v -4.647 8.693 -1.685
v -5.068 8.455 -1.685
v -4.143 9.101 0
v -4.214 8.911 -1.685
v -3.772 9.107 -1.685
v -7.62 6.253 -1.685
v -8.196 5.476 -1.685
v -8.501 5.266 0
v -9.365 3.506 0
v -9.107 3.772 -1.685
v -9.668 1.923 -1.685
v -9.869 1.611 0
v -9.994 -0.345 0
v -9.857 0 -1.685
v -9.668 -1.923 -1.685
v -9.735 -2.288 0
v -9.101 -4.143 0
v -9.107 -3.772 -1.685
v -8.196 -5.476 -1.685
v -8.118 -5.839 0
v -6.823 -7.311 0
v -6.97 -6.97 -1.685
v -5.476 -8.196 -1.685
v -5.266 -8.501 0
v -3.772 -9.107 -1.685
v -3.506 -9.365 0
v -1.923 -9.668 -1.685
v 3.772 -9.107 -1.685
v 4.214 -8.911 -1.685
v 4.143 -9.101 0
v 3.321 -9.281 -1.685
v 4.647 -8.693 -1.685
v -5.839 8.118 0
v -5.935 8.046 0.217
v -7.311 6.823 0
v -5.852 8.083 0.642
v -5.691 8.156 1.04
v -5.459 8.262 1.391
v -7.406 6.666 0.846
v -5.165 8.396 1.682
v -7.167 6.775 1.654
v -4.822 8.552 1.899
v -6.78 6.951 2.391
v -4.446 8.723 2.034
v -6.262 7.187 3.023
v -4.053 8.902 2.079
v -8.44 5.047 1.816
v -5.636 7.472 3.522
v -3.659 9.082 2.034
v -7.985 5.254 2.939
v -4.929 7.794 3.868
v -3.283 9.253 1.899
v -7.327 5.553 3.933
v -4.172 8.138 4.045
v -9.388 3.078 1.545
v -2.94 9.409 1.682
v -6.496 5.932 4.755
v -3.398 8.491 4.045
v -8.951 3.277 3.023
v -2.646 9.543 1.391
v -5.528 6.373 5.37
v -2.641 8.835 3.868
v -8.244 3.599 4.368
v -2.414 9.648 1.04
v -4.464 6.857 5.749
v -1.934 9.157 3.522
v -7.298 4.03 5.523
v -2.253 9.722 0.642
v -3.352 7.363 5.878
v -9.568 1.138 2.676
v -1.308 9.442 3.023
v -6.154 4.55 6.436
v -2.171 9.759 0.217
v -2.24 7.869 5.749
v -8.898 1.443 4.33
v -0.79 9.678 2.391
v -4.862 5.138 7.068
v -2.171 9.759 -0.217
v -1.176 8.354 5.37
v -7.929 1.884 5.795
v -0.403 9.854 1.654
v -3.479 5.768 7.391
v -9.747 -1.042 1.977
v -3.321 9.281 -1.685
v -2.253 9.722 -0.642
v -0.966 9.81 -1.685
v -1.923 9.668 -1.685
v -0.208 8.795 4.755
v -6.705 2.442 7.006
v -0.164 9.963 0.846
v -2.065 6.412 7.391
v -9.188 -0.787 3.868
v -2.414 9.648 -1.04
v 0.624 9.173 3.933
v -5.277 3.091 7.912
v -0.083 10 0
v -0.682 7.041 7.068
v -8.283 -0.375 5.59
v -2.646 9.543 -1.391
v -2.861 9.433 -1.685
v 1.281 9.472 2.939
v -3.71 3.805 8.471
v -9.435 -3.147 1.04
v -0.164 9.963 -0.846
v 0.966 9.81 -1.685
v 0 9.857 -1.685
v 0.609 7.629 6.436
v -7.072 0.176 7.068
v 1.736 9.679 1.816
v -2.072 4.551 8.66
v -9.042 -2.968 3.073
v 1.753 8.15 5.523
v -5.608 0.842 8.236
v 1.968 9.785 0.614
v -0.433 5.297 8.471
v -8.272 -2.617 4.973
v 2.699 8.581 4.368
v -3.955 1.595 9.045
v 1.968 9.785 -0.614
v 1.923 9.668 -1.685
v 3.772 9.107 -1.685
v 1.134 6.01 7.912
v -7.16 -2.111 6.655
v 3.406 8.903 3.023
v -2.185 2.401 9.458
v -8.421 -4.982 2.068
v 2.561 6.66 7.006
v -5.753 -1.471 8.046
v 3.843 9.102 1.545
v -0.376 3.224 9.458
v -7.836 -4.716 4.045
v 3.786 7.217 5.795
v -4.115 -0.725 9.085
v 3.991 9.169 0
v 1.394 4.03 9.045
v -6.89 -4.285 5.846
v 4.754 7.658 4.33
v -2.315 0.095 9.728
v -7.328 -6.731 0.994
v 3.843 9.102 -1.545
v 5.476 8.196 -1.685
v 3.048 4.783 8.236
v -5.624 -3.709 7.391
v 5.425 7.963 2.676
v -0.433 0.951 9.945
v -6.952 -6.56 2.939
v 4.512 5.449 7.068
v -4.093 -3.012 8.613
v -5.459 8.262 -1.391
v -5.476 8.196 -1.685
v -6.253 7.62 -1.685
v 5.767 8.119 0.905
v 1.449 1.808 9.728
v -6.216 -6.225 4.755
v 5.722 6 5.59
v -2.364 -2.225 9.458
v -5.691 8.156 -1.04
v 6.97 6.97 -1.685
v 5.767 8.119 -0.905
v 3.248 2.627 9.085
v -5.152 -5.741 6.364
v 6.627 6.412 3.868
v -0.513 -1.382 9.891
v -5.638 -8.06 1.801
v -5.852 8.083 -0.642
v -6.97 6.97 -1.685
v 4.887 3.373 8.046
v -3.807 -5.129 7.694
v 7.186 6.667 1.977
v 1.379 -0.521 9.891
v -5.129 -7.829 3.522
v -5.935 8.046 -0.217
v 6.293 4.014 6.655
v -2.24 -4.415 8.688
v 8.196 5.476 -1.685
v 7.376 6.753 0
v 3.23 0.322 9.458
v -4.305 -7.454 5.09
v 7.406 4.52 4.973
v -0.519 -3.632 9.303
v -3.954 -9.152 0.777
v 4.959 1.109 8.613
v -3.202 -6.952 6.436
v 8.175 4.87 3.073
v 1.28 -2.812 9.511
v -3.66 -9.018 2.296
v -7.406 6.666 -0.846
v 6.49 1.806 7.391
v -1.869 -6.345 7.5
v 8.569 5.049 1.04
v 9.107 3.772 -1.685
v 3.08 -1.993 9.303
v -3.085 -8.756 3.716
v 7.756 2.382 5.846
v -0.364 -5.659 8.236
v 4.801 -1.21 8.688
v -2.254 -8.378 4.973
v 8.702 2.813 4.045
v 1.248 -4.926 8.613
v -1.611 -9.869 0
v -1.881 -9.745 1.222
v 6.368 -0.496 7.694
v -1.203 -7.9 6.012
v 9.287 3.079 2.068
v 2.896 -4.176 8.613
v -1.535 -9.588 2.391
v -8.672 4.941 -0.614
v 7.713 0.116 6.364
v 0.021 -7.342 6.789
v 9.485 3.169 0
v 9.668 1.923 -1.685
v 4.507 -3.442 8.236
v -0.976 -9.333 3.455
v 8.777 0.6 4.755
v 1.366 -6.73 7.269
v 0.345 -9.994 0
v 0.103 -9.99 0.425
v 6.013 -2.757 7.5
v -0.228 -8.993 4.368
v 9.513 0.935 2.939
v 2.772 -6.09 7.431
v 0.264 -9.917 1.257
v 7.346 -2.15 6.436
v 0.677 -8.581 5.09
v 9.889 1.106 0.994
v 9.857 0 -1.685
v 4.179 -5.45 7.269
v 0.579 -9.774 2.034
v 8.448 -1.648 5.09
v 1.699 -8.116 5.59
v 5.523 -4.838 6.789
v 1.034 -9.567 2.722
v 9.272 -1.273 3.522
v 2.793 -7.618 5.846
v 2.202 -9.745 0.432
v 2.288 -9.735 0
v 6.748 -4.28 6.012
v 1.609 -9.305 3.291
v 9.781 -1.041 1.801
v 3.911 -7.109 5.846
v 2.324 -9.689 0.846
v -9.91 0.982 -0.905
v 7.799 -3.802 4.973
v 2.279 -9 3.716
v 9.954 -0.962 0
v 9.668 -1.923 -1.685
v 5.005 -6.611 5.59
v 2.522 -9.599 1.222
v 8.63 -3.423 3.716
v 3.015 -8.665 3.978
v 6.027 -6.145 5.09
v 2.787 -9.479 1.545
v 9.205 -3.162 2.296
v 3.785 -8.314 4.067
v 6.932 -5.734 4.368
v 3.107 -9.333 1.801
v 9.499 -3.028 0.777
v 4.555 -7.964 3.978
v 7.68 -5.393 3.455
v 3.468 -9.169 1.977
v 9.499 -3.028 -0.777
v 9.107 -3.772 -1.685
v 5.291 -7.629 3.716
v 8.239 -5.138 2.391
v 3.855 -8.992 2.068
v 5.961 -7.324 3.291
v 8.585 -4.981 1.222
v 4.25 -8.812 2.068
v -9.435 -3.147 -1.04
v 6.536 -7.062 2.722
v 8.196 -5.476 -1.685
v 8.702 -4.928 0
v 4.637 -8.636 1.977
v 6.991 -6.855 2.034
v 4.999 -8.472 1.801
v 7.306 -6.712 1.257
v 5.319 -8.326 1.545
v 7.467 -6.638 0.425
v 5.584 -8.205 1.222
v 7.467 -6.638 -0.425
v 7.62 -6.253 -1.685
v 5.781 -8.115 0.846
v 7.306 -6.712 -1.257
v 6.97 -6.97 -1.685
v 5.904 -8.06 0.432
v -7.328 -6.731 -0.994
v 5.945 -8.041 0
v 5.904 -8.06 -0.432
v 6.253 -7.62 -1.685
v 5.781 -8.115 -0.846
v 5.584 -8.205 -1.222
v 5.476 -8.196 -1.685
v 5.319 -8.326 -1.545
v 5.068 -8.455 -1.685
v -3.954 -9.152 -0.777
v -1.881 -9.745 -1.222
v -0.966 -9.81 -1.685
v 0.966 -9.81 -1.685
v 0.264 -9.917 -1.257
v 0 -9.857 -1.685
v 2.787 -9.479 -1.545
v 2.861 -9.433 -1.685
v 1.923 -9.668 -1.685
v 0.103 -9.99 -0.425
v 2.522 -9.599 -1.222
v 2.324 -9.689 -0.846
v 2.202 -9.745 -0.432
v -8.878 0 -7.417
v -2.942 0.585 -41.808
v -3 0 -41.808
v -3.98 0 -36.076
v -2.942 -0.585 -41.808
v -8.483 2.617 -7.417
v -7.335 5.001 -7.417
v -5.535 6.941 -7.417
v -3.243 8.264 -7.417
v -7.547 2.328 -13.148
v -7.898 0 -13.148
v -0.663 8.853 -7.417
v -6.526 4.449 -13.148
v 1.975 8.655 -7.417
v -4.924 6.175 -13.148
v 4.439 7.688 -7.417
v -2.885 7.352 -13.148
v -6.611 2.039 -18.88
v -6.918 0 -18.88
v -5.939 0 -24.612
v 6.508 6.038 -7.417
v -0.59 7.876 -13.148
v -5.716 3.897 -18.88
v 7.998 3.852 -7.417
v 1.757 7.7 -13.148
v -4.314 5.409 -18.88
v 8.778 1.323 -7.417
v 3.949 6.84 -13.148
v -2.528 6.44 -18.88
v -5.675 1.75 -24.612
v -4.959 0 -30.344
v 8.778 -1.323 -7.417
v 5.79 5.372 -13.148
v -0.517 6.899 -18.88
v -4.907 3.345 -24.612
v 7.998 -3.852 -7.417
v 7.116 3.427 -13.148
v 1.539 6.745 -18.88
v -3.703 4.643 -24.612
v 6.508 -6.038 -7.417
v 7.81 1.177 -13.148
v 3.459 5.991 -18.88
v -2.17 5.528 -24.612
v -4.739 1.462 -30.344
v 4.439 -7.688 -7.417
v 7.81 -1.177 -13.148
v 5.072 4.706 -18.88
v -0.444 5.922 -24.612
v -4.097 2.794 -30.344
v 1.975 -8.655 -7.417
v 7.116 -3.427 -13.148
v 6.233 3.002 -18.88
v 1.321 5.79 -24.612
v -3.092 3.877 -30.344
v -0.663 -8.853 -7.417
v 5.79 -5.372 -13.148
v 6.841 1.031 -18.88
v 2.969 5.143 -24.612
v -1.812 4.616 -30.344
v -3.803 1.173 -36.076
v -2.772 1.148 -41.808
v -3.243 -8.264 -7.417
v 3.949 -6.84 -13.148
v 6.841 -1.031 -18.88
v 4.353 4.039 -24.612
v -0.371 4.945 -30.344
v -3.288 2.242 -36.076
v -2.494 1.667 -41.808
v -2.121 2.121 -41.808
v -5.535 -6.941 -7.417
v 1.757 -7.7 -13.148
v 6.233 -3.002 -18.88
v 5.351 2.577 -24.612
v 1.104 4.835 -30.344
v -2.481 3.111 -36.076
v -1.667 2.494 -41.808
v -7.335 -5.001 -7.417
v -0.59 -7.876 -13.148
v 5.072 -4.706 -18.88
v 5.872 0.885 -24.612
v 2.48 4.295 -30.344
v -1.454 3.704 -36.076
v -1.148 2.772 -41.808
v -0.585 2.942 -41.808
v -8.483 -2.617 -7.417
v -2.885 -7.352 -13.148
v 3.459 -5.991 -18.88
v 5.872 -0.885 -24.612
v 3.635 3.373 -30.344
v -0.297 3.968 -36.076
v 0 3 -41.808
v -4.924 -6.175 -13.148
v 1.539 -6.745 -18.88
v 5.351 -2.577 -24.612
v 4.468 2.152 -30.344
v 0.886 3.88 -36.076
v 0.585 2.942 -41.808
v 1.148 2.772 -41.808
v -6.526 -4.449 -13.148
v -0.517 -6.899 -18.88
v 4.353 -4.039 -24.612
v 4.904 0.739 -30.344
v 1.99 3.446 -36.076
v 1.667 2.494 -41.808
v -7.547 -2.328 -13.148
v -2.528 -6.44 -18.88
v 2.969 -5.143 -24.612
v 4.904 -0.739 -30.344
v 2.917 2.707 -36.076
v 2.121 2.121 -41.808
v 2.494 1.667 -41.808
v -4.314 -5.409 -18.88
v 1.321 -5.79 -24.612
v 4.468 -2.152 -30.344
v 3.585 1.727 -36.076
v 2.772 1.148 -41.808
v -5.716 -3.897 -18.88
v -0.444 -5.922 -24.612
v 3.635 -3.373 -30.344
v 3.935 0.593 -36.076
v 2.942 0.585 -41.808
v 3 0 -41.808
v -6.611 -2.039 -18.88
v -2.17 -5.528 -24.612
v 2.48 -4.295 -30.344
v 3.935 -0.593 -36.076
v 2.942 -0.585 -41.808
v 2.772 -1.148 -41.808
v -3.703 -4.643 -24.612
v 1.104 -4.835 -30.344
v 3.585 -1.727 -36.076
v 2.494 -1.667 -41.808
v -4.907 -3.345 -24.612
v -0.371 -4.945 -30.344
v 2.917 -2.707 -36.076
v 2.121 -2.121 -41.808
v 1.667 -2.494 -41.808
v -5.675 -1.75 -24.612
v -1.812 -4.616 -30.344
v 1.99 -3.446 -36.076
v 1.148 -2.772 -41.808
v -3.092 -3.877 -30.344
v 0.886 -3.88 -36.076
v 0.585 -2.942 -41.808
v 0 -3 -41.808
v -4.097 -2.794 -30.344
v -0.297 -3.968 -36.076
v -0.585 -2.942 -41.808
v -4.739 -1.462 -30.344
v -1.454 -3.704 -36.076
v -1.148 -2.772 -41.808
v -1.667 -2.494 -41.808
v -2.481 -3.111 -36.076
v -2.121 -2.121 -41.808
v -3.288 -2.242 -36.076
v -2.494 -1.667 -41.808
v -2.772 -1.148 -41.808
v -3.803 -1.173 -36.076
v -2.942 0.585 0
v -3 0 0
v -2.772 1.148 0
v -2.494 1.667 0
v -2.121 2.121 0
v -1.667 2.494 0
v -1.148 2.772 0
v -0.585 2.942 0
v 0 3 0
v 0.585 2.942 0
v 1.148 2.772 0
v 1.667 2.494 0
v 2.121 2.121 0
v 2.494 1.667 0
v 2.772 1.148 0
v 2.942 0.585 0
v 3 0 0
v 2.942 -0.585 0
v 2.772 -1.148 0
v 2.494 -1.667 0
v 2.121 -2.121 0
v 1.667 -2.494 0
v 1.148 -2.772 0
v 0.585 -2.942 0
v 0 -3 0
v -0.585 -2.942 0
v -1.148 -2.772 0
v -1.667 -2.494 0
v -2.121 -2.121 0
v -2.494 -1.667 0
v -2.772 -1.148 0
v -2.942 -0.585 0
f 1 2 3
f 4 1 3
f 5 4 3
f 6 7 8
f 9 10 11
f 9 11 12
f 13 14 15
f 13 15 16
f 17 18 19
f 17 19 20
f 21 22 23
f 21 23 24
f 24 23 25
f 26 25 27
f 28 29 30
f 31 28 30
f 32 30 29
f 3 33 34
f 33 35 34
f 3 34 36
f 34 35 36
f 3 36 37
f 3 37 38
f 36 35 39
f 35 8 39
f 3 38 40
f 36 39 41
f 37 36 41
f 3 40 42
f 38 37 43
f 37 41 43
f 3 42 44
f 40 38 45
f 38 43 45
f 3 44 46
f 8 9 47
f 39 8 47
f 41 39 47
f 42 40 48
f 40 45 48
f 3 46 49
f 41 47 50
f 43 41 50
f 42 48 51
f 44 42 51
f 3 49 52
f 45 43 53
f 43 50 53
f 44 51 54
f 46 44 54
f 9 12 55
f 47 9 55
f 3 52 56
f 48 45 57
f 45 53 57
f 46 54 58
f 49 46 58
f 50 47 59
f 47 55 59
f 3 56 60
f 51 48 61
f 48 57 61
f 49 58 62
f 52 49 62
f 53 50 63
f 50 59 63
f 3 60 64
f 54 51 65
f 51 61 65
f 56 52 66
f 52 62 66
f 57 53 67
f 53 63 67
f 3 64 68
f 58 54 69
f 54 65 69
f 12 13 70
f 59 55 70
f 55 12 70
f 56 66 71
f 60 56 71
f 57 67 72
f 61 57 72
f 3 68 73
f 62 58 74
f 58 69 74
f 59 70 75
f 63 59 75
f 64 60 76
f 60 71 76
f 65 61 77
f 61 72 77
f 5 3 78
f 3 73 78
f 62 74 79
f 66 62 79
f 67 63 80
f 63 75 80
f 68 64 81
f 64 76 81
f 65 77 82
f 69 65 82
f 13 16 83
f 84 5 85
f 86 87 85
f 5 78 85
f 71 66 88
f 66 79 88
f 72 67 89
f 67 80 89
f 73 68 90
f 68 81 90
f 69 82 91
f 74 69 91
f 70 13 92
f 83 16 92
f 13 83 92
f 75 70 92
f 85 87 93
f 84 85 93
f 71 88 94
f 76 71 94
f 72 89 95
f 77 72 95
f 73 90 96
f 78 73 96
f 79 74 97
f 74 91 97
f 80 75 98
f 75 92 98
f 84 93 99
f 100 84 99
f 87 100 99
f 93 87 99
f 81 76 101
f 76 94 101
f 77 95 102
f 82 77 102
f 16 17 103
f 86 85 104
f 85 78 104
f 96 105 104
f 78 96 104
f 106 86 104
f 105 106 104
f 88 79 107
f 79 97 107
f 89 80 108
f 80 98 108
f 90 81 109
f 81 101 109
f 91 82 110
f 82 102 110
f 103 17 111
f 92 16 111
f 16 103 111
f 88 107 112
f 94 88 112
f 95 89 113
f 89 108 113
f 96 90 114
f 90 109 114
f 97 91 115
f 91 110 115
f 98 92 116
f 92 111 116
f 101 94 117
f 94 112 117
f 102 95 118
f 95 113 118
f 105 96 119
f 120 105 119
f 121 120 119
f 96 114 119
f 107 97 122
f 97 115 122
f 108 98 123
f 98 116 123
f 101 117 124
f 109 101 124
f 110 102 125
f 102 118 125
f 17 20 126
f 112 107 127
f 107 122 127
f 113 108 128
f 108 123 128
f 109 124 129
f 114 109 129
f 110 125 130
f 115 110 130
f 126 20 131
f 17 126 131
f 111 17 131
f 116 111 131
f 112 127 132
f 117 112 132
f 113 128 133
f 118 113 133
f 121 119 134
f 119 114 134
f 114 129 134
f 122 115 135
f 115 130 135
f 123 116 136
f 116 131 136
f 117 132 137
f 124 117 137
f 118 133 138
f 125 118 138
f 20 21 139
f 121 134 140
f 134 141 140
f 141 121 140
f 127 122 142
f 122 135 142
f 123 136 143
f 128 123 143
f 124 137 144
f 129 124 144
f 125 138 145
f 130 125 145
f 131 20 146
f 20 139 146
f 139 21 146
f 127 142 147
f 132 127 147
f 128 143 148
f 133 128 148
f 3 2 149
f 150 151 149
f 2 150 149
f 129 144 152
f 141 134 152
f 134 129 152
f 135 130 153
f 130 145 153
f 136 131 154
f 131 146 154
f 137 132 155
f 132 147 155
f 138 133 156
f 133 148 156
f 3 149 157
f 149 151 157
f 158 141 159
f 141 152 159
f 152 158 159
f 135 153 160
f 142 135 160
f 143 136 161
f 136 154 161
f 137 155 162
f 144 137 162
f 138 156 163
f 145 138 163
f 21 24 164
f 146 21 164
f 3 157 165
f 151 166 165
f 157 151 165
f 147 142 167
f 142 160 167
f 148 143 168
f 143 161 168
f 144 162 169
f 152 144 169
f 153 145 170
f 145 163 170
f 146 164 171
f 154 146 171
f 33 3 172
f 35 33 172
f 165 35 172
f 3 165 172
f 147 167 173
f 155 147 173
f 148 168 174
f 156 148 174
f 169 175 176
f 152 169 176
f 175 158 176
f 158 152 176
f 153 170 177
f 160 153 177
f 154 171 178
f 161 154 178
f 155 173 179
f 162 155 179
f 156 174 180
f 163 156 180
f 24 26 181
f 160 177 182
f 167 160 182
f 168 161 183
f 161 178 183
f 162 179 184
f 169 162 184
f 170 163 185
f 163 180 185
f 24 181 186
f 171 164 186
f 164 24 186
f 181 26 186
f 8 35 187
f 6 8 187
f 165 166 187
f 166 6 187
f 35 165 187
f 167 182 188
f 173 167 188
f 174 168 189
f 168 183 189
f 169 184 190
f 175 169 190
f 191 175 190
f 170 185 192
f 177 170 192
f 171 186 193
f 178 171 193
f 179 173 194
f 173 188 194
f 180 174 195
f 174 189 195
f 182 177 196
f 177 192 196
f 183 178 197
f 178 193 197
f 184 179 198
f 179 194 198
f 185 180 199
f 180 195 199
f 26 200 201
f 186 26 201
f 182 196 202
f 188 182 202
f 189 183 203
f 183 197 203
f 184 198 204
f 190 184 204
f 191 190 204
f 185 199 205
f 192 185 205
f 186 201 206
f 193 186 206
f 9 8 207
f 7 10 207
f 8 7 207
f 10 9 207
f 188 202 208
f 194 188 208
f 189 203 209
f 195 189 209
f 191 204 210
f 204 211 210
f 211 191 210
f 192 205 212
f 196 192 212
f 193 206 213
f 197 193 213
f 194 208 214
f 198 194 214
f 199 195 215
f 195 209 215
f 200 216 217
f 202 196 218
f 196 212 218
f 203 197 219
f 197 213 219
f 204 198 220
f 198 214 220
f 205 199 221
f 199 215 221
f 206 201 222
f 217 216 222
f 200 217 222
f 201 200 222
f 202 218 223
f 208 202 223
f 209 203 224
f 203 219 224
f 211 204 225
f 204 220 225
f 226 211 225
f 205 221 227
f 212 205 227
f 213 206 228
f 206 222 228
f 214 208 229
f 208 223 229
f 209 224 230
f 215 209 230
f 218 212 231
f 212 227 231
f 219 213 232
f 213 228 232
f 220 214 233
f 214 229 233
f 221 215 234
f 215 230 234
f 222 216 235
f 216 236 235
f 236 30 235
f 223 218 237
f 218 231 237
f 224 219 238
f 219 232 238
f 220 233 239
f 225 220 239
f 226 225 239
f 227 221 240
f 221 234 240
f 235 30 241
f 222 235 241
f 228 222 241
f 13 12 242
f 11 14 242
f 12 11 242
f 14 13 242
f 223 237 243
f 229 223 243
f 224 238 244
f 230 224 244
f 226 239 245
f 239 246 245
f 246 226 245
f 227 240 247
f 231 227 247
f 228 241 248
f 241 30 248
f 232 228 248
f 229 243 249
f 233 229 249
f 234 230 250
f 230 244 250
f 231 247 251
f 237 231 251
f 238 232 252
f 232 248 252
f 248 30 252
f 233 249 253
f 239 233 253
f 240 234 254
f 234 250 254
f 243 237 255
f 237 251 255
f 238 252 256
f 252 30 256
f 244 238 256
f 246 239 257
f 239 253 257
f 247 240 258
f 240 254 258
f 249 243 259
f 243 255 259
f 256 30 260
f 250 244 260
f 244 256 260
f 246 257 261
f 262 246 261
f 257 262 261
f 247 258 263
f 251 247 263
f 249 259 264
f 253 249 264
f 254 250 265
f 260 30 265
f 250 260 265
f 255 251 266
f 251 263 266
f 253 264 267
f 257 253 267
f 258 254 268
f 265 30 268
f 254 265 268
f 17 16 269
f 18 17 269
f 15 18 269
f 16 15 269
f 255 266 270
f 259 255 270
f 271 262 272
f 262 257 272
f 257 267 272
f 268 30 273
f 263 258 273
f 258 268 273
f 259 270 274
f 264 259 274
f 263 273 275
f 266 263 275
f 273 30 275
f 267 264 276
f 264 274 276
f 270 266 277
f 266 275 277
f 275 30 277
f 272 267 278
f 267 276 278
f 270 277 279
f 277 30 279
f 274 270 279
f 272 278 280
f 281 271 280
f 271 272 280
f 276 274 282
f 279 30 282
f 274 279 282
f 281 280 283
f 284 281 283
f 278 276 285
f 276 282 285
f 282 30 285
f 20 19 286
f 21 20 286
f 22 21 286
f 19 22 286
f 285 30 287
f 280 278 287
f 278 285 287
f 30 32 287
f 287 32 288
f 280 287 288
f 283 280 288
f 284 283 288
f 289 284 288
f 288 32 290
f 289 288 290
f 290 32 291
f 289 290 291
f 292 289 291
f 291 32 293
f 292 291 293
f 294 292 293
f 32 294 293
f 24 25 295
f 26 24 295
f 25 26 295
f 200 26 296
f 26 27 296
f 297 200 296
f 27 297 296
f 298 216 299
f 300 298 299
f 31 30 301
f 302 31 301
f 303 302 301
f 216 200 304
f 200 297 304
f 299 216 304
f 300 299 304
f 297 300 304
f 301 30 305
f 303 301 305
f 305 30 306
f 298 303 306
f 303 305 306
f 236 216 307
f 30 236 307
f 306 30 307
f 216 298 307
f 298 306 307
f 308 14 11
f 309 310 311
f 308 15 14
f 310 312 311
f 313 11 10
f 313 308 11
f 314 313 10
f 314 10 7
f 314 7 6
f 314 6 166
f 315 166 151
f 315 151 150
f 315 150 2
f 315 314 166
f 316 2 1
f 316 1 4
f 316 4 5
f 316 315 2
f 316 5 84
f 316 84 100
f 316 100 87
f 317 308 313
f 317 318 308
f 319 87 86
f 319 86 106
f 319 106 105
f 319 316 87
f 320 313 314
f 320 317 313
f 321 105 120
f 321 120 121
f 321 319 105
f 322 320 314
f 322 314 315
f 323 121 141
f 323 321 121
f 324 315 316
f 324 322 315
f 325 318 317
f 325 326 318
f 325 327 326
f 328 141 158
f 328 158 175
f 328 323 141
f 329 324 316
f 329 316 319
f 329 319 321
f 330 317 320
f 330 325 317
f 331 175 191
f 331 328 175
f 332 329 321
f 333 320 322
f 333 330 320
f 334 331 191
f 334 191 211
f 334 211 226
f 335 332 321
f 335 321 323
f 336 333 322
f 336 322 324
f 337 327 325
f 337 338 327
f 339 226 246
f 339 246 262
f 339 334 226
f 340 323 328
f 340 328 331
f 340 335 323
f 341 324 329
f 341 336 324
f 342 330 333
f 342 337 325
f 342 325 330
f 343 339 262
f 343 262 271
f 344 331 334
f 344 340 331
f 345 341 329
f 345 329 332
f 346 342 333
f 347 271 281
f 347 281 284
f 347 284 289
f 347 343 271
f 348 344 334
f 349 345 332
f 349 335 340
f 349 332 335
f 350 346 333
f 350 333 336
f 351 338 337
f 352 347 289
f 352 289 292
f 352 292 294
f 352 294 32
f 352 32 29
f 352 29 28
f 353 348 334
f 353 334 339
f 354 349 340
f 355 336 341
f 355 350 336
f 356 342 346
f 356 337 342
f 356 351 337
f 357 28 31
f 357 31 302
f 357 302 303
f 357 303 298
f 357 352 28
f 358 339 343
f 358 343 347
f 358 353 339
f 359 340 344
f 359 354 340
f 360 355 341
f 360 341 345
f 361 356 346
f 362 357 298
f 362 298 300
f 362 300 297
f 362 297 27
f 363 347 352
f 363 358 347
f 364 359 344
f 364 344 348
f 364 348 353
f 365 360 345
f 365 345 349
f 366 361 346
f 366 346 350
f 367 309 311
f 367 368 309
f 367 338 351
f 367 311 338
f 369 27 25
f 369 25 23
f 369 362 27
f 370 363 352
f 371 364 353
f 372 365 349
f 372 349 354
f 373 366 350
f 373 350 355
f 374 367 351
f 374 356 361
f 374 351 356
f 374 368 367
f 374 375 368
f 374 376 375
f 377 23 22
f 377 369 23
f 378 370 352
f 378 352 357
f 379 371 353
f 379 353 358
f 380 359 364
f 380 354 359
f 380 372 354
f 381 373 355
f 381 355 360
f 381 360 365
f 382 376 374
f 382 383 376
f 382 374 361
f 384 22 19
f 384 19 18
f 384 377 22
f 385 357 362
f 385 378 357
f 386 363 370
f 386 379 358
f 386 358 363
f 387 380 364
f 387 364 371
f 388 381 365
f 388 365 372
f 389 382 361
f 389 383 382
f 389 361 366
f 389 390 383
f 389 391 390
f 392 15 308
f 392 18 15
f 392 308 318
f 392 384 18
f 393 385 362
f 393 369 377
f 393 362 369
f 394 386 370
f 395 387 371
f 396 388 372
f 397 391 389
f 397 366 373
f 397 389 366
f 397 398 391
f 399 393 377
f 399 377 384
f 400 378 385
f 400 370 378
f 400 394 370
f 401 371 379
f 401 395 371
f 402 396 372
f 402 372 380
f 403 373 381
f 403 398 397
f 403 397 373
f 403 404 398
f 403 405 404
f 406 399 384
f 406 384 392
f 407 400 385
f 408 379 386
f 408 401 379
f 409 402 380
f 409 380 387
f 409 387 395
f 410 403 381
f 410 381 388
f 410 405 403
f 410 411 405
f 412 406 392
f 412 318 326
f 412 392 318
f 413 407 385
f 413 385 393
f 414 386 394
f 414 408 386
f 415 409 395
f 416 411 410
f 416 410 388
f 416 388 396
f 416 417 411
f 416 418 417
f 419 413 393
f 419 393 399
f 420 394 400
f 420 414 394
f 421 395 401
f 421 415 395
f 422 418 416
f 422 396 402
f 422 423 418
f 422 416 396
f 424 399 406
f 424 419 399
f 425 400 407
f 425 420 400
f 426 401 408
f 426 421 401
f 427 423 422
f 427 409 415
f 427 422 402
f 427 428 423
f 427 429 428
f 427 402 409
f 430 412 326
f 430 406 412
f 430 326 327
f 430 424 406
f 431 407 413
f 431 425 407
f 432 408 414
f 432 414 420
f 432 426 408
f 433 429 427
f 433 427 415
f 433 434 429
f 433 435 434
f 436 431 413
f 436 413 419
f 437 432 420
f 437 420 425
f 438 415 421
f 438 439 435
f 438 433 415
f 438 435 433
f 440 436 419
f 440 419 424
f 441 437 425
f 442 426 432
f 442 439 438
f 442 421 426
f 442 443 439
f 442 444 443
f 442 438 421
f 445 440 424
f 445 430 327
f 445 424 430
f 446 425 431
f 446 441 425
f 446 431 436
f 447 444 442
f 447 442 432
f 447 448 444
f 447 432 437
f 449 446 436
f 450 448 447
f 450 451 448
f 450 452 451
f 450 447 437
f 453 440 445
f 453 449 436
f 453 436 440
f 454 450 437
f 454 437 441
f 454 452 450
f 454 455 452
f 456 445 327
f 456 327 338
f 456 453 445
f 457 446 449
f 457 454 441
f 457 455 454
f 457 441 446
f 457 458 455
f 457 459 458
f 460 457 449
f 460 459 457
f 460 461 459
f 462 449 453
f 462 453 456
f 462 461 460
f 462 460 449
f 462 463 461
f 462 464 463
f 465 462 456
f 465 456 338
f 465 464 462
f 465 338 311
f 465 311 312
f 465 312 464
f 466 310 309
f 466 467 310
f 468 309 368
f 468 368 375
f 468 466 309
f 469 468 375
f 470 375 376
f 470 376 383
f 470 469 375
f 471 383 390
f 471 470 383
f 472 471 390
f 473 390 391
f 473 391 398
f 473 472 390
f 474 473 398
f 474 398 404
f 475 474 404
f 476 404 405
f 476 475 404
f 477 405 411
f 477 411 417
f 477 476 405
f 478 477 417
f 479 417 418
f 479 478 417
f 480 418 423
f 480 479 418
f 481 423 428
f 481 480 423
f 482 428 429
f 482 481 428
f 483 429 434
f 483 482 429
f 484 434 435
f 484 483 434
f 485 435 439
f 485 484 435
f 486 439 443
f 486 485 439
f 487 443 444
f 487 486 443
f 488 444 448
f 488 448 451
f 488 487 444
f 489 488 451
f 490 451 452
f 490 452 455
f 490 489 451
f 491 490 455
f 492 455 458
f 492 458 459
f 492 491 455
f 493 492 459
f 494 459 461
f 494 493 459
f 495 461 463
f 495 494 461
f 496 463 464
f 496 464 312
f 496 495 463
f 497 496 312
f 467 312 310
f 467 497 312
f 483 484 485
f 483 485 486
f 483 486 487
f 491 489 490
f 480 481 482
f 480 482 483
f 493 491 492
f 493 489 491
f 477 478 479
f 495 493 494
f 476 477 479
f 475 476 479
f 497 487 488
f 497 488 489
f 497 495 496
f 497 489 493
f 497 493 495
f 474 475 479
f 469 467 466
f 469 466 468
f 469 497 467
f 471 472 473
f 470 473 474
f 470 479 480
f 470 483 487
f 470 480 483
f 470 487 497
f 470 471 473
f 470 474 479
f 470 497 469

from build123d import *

# Parameters (mm, degrees)
SKETCH_2_R          = 3
CUT_EXTRUDE_1_DEPTH = 11
SKETCH_3_R          = 3
EXTRUDE_1_DEPTH     = 40
SKETCH_5_R          = 3
CUT_EXTRUDE_2_DEPTH = 40


with BuildPart() as part:
    # 草图1 → 旋转1 (revolve)
    with BuildSketch(Plane.XY):
        with BuildLine():
            Line((4.143240259, -9.101294422), (-4.143240259, 9.101294422))
            ThreePointArc((-4.143240259, 9.101294422), (-9.101294422, -4.143240259), (4.143240259, -9.101294422))
        make_face()
    revolve(axis=Axis((4.143240259, -9.101294422, 0), (-0.414324026, 0.910129442, 0)))

    # 草图2 → 切除-拉伸1 (cut, through all)
    with BuildSketch(Plane.XY):
        Circle(SKETCH_2_R)
    extrude(amount=-CUT_EXTRUDE_1_DEPTH, mode=Mode.SUBTRACT)

    # 草图3 → 凸台-拉伸1 (add)
    with BuildSketch(Plane(origin=(0, 0, 0), x_dir=(-1, 0, 0), z_dir=(0, 0, -1))):
        Circle(SKETCH_3_R)
    extrude(amount=EXTRUDE_1_DEPTH)

    # 草图4 → 旋转2 (revolve)
    with BuildSketch(Plane(origin=(0, 0, 0), x_dir=(1, 0, 0), z_dir=(0, 1, 0))):
        Polygon((-3, 0.512695407), (-9.857091429, 1.684561833), (-3, 41.808335168), align=None)
    revolve(axis=Axis((0, 0, 0), (0, 0, -1)))

    # 草图5 → 切除-拉伸2 (cut)
    with BuildSketch(Plane(origin=(0, 0, -40), x_dir=(-1, 0, 0), z_dir=(0, 0, -1))):
        Circle(SKETCH_5_R)
    extrude(amount=-CUT_EXTRUDE_2_DEPTH, mode=Mode.SUBTRACT)


solid = part.part
